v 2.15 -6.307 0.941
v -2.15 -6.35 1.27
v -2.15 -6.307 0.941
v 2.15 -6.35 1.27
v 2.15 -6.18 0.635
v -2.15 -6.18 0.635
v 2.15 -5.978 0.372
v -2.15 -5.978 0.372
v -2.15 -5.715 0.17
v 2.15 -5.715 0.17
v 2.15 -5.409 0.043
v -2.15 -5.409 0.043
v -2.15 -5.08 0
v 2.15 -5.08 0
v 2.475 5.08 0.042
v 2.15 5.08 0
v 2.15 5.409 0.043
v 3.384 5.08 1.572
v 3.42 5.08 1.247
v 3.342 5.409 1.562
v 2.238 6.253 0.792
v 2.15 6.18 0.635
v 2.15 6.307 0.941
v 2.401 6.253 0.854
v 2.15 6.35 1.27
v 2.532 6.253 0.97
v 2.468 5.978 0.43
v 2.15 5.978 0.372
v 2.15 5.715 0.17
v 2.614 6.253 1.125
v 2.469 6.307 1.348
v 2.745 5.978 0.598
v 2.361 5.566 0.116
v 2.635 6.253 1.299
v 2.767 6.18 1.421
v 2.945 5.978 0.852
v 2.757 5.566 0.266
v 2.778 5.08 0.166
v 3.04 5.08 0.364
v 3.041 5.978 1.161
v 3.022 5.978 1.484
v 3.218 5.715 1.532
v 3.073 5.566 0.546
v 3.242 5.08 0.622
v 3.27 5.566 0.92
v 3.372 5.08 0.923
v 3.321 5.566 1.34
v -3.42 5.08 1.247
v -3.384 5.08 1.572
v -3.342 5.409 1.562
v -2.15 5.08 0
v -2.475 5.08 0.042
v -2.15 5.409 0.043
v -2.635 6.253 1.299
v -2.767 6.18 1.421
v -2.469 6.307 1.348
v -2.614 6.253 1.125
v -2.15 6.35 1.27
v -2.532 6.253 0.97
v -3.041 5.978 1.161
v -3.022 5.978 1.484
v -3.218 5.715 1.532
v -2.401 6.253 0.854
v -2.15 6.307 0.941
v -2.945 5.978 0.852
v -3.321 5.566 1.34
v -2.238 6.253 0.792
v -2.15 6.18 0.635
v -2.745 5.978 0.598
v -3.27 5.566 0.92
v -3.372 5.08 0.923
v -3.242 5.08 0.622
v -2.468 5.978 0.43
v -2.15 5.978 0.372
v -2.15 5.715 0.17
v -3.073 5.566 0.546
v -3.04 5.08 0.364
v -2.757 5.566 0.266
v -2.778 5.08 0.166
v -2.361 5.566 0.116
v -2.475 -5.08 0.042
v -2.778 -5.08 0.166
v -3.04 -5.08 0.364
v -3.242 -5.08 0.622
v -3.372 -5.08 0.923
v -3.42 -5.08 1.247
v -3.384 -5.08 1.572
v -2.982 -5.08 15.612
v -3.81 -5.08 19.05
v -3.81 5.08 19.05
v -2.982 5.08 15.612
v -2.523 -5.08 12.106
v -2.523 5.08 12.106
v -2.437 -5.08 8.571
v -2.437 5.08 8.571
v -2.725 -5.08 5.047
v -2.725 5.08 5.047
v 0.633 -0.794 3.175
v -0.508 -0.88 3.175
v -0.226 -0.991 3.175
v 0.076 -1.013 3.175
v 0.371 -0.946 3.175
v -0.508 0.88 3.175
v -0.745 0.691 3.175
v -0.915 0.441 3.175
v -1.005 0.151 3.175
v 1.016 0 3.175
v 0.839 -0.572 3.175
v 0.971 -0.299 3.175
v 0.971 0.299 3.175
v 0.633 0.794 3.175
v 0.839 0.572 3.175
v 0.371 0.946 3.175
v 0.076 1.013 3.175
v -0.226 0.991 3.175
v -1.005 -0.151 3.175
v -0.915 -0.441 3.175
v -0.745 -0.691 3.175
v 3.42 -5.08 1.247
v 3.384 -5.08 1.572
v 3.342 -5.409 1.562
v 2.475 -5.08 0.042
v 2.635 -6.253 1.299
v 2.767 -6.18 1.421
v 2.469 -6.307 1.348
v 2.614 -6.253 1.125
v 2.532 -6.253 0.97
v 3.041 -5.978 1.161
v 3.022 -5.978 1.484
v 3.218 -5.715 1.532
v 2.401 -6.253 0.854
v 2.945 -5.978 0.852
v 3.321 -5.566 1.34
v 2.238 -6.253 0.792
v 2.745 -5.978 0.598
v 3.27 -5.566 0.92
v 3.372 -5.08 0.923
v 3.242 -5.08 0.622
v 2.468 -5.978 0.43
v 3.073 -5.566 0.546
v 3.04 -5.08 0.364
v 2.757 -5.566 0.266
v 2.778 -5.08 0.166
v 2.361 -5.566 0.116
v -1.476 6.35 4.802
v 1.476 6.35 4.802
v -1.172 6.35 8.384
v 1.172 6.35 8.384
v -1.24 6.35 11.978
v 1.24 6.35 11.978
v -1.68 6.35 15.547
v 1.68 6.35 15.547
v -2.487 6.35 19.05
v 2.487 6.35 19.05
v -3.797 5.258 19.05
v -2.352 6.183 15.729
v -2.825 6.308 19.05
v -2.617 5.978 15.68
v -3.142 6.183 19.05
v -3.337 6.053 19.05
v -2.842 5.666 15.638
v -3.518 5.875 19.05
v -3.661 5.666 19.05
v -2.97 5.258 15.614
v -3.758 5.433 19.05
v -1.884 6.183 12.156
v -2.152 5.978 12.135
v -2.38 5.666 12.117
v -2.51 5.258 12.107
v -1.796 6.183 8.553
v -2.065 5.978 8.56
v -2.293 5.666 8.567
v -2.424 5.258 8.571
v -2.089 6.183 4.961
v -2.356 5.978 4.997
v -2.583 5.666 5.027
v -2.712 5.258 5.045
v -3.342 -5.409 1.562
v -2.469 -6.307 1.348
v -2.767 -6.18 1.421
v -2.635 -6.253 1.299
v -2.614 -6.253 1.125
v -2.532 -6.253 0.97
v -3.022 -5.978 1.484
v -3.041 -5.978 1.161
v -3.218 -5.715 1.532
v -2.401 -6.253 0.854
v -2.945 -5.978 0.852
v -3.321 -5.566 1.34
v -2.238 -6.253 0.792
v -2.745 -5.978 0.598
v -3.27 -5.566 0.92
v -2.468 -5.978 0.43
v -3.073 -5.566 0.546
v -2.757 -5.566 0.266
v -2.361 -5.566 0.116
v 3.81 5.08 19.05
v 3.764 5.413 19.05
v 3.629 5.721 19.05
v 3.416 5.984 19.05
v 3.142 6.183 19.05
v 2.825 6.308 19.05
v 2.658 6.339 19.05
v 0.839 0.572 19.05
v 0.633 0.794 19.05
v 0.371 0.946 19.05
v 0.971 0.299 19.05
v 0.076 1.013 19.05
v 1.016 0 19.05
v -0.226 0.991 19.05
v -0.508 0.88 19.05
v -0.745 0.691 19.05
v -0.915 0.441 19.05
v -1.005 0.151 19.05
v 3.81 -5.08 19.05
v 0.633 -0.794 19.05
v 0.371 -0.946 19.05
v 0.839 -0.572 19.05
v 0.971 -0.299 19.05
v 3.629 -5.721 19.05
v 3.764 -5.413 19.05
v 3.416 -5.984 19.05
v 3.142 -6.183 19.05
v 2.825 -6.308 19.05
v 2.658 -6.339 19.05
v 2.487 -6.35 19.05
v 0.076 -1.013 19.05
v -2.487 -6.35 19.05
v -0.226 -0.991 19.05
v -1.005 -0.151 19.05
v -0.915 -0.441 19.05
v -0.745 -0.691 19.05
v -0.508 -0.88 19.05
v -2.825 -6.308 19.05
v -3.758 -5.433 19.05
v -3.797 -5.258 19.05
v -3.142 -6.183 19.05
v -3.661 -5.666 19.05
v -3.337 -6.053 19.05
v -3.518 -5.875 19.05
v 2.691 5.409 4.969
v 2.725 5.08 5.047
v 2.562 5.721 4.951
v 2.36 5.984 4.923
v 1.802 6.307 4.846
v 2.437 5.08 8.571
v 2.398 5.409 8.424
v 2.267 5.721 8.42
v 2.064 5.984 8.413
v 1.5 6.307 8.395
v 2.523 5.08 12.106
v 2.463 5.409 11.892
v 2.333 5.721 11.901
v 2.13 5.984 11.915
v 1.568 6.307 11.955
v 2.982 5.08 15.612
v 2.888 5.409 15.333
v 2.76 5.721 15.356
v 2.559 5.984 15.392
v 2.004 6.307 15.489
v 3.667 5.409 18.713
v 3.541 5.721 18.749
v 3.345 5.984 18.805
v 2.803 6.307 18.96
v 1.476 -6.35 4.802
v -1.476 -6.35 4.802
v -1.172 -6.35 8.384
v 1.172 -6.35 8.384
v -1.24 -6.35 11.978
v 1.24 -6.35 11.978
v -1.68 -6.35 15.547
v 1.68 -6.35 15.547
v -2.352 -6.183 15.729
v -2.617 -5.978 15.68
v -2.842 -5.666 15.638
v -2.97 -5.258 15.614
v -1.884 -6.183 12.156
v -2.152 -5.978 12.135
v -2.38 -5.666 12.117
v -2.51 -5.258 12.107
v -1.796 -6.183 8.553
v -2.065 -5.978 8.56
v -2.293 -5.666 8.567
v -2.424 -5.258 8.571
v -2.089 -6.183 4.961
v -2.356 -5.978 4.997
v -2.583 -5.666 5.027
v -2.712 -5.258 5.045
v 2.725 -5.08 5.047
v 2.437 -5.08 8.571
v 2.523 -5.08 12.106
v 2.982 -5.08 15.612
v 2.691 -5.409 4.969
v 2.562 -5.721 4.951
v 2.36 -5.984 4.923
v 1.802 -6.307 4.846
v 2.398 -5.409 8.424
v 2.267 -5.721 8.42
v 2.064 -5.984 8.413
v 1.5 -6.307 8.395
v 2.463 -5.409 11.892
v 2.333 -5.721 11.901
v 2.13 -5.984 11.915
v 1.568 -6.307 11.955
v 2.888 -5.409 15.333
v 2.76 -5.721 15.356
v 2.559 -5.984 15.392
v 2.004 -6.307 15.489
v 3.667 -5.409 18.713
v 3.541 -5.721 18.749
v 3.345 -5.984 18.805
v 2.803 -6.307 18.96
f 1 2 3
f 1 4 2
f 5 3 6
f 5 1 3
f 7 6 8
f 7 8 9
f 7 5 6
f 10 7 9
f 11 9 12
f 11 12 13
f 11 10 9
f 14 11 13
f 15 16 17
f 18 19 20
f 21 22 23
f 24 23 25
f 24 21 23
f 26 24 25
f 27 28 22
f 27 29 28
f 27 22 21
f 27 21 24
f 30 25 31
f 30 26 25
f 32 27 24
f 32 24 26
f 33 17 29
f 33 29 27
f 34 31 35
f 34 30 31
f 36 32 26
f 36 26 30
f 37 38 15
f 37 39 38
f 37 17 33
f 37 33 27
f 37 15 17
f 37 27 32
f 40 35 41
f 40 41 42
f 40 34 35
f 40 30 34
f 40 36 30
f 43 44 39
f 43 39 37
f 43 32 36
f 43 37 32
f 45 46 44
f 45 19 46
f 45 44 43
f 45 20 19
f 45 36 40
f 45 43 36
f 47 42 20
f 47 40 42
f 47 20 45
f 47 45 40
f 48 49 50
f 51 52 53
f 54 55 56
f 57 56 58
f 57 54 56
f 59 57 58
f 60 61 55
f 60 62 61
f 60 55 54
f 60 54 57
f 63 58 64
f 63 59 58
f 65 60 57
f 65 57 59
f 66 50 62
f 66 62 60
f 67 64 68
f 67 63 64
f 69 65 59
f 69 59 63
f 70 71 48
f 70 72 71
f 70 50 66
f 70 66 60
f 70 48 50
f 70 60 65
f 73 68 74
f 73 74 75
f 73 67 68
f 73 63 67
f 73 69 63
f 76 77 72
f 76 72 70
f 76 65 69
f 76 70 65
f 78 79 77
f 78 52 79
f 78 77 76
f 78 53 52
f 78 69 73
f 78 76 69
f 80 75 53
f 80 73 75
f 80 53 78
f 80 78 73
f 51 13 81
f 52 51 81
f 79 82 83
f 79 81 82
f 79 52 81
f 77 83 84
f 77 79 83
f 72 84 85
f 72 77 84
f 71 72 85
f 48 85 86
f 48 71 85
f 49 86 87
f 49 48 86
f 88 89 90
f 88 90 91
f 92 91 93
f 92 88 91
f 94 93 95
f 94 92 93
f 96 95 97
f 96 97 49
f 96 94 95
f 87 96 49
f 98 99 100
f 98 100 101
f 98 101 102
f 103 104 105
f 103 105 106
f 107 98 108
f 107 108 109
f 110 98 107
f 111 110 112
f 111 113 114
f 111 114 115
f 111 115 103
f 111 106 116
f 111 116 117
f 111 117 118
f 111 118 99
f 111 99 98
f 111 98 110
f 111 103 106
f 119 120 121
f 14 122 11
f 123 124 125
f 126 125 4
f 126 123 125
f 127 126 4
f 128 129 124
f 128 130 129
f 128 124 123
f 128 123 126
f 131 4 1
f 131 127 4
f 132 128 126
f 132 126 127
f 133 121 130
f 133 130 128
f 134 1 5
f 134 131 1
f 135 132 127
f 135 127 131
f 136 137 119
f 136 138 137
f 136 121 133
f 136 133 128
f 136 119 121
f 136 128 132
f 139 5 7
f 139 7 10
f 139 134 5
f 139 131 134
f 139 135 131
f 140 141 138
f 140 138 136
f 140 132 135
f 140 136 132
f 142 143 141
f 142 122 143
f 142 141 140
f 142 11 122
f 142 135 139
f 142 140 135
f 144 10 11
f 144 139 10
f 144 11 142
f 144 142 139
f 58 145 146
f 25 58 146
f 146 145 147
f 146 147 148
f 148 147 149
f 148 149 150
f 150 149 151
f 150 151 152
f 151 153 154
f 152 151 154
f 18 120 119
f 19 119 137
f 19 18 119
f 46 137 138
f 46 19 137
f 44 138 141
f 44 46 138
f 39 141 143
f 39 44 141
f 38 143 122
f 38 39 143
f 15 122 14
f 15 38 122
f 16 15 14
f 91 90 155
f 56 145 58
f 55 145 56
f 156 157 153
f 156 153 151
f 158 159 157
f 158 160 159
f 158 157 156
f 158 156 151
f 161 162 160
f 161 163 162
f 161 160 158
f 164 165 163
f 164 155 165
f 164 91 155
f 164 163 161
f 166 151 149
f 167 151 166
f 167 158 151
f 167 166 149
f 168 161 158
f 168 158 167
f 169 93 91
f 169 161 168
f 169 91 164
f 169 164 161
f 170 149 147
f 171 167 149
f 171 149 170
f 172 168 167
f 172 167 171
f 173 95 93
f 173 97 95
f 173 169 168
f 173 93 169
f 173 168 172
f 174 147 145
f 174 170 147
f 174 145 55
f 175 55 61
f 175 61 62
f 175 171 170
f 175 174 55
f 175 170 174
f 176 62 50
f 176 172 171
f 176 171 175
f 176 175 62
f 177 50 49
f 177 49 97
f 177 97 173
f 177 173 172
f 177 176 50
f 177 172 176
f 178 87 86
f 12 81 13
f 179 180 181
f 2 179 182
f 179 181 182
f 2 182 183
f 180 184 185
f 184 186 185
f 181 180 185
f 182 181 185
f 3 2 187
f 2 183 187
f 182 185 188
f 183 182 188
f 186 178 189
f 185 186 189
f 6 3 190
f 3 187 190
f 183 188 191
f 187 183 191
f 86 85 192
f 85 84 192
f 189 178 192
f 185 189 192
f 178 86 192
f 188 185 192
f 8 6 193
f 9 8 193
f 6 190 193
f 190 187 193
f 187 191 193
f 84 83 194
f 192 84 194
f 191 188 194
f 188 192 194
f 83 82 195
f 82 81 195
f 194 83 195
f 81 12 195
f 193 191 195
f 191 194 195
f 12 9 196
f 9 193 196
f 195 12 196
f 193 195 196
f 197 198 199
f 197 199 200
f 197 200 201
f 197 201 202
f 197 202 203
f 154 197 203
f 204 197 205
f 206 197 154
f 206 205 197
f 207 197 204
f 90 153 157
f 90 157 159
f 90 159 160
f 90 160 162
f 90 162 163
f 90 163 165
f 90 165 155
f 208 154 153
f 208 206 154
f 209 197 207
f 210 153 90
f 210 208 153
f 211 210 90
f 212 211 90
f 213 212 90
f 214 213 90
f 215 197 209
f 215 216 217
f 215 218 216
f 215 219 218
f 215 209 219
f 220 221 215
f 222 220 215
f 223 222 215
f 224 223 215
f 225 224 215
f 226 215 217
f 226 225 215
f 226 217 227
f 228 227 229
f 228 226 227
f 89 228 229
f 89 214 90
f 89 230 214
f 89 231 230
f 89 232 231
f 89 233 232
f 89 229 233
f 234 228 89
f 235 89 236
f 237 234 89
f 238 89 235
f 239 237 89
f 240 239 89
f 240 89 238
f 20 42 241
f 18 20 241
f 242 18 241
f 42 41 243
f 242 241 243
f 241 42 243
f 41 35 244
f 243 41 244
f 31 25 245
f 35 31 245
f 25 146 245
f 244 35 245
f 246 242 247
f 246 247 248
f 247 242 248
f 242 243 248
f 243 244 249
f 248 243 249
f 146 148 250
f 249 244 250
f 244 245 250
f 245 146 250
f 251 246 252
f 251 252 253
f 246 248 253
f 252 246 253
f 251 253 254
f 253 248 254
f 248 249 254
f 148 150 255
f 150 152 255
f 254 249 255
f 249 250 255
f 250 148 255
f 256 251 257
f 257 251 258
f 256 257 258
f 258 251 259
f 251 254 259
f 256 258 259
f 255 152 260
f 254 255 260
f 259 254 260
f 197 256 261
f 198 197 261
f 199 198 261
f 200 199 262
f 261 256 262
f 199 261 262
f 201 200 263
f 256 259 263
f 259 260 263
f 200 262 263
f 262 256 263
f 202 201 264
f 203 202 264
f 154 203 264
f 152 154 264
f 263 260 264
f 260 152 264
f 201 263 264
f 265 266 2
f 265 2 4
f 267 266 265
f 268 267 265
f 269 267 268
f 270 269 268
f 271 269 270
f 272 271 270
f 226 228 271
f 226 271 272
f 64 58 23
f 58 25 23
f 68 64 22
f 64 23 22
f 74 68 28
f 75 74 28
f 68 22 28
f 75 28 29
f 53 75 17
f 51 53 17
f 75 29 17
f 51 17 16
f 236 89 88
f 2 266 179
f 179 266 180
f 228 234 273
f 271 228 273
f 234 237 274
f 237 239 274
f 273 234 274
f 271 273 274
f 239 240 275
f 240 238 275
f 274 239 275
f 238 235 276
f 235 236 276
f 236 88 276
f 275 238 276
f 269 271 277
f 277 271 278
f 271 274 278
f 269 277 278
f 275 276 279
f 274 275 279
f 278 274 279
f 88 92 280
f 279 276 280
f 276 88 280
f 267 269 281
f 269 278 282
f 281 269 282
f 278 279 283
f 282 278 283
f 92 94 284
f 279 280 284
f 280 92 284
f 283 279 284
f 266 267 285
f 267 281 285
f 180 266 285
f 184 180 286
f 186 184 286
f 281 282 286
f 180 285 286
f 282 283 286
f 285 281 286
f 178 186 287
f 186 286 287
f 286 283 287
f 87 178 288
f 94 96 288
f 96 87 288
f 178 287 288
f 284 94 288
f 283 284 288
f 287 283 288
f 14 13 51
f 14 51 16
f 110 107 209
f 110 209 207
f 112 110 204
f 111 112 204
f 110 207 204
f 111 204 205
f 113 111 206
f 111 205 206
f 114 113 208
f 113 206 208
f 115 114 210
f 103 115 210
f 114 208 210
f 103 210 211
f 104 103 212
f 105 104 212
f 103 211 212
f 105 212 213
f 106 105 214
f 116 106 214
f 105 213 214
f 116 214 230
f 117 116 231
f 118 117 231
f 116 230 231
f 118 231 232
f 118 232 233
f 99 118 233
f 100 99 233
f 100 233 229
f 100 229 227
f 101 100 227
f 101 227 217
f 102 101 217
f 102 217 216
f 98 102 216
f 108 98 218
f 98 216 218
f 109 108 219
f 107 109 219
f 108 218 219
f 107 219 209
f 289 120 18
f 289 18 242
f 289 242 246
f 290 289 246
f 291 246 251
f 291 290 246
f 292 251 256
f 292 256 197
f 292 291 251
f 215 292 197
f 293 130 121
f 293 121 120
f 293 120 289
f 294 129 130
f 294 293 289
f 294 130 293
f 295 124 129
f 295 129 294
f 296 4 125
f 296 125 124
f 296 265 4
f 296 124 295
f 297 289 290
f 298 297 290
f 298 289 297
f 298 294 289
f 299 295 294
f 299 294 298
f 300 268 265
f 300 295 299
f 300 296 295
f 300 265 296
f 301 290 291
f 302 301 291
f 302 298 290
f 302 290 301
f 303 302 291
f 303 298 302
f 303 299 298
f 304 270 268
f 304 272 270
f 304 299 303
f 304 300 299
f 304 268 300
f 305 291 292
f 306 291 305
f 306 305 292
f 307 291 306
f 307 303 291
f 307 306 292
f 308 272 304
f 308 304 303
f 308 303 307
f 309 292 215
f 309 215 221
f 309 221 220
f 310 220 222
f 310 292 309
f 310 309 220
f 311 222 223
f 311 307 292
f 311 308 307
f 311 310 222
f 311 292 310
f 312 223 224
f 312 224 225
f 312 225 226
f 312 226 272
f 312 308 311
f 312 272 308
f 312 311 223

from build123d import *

# Parameters (mm, degrees)
F1_DEPTH = 6.35
F2_R     = 1.016
F3_DEPTH = 15.875
F4_R     = 1.27


with BuildPart() as f1:
    # F0 (on Front) → F1 (new body, symmetric)
    with BuildSketch(Plane.XZ):
        with BuildLine():
            Line((0, 0), (3.81, 0))
            ThreePointArc((3.81, 0), (2.422893, 9.525), (3.81, 19.05))
            Line((3.81, 19.05), (0, 19.05))
            Line((0, 19.05), (0, 0))
        make_face()
        with BuildLine():
            Line((-3.81, 0), (0, 0))
            Line((0, 0), (0, 19.05))
            Line((0, 19.05), (-3.81, 19.05))
            ThreePointArc((-3.81, 19.05), (-2.422893, 9.525), (-3.81, 0))
        make_face()
    extrude(amount=F1_DEPTH, both=True)

    # F2 (on face) → F3 (cut)
    with BuildSketch(Plane.XY.offset(19.05)):
        Circle(F2_R)
    extrude(amount=-F3_DEPTH, mode=Mode.SUBTRACT)

    # F4
    f4_edges = [f1.edges().sort_by_distance(p)[0] for p in [
        (2.422893, -6.35, 9.525),
        (-2.422893, -6.35, 9.525),
        (0, -6.35, 0),
        (3.81, 0, 0),
        (0, 6.35, 0),
        (-3.81, 0, 0),
        (-2.422893, 6.35, 9.525),
        (2.422893, 6.35, 9.525),
    ]]
    fillet(f4_edges, radius=F4_R)


solid = f1.part
